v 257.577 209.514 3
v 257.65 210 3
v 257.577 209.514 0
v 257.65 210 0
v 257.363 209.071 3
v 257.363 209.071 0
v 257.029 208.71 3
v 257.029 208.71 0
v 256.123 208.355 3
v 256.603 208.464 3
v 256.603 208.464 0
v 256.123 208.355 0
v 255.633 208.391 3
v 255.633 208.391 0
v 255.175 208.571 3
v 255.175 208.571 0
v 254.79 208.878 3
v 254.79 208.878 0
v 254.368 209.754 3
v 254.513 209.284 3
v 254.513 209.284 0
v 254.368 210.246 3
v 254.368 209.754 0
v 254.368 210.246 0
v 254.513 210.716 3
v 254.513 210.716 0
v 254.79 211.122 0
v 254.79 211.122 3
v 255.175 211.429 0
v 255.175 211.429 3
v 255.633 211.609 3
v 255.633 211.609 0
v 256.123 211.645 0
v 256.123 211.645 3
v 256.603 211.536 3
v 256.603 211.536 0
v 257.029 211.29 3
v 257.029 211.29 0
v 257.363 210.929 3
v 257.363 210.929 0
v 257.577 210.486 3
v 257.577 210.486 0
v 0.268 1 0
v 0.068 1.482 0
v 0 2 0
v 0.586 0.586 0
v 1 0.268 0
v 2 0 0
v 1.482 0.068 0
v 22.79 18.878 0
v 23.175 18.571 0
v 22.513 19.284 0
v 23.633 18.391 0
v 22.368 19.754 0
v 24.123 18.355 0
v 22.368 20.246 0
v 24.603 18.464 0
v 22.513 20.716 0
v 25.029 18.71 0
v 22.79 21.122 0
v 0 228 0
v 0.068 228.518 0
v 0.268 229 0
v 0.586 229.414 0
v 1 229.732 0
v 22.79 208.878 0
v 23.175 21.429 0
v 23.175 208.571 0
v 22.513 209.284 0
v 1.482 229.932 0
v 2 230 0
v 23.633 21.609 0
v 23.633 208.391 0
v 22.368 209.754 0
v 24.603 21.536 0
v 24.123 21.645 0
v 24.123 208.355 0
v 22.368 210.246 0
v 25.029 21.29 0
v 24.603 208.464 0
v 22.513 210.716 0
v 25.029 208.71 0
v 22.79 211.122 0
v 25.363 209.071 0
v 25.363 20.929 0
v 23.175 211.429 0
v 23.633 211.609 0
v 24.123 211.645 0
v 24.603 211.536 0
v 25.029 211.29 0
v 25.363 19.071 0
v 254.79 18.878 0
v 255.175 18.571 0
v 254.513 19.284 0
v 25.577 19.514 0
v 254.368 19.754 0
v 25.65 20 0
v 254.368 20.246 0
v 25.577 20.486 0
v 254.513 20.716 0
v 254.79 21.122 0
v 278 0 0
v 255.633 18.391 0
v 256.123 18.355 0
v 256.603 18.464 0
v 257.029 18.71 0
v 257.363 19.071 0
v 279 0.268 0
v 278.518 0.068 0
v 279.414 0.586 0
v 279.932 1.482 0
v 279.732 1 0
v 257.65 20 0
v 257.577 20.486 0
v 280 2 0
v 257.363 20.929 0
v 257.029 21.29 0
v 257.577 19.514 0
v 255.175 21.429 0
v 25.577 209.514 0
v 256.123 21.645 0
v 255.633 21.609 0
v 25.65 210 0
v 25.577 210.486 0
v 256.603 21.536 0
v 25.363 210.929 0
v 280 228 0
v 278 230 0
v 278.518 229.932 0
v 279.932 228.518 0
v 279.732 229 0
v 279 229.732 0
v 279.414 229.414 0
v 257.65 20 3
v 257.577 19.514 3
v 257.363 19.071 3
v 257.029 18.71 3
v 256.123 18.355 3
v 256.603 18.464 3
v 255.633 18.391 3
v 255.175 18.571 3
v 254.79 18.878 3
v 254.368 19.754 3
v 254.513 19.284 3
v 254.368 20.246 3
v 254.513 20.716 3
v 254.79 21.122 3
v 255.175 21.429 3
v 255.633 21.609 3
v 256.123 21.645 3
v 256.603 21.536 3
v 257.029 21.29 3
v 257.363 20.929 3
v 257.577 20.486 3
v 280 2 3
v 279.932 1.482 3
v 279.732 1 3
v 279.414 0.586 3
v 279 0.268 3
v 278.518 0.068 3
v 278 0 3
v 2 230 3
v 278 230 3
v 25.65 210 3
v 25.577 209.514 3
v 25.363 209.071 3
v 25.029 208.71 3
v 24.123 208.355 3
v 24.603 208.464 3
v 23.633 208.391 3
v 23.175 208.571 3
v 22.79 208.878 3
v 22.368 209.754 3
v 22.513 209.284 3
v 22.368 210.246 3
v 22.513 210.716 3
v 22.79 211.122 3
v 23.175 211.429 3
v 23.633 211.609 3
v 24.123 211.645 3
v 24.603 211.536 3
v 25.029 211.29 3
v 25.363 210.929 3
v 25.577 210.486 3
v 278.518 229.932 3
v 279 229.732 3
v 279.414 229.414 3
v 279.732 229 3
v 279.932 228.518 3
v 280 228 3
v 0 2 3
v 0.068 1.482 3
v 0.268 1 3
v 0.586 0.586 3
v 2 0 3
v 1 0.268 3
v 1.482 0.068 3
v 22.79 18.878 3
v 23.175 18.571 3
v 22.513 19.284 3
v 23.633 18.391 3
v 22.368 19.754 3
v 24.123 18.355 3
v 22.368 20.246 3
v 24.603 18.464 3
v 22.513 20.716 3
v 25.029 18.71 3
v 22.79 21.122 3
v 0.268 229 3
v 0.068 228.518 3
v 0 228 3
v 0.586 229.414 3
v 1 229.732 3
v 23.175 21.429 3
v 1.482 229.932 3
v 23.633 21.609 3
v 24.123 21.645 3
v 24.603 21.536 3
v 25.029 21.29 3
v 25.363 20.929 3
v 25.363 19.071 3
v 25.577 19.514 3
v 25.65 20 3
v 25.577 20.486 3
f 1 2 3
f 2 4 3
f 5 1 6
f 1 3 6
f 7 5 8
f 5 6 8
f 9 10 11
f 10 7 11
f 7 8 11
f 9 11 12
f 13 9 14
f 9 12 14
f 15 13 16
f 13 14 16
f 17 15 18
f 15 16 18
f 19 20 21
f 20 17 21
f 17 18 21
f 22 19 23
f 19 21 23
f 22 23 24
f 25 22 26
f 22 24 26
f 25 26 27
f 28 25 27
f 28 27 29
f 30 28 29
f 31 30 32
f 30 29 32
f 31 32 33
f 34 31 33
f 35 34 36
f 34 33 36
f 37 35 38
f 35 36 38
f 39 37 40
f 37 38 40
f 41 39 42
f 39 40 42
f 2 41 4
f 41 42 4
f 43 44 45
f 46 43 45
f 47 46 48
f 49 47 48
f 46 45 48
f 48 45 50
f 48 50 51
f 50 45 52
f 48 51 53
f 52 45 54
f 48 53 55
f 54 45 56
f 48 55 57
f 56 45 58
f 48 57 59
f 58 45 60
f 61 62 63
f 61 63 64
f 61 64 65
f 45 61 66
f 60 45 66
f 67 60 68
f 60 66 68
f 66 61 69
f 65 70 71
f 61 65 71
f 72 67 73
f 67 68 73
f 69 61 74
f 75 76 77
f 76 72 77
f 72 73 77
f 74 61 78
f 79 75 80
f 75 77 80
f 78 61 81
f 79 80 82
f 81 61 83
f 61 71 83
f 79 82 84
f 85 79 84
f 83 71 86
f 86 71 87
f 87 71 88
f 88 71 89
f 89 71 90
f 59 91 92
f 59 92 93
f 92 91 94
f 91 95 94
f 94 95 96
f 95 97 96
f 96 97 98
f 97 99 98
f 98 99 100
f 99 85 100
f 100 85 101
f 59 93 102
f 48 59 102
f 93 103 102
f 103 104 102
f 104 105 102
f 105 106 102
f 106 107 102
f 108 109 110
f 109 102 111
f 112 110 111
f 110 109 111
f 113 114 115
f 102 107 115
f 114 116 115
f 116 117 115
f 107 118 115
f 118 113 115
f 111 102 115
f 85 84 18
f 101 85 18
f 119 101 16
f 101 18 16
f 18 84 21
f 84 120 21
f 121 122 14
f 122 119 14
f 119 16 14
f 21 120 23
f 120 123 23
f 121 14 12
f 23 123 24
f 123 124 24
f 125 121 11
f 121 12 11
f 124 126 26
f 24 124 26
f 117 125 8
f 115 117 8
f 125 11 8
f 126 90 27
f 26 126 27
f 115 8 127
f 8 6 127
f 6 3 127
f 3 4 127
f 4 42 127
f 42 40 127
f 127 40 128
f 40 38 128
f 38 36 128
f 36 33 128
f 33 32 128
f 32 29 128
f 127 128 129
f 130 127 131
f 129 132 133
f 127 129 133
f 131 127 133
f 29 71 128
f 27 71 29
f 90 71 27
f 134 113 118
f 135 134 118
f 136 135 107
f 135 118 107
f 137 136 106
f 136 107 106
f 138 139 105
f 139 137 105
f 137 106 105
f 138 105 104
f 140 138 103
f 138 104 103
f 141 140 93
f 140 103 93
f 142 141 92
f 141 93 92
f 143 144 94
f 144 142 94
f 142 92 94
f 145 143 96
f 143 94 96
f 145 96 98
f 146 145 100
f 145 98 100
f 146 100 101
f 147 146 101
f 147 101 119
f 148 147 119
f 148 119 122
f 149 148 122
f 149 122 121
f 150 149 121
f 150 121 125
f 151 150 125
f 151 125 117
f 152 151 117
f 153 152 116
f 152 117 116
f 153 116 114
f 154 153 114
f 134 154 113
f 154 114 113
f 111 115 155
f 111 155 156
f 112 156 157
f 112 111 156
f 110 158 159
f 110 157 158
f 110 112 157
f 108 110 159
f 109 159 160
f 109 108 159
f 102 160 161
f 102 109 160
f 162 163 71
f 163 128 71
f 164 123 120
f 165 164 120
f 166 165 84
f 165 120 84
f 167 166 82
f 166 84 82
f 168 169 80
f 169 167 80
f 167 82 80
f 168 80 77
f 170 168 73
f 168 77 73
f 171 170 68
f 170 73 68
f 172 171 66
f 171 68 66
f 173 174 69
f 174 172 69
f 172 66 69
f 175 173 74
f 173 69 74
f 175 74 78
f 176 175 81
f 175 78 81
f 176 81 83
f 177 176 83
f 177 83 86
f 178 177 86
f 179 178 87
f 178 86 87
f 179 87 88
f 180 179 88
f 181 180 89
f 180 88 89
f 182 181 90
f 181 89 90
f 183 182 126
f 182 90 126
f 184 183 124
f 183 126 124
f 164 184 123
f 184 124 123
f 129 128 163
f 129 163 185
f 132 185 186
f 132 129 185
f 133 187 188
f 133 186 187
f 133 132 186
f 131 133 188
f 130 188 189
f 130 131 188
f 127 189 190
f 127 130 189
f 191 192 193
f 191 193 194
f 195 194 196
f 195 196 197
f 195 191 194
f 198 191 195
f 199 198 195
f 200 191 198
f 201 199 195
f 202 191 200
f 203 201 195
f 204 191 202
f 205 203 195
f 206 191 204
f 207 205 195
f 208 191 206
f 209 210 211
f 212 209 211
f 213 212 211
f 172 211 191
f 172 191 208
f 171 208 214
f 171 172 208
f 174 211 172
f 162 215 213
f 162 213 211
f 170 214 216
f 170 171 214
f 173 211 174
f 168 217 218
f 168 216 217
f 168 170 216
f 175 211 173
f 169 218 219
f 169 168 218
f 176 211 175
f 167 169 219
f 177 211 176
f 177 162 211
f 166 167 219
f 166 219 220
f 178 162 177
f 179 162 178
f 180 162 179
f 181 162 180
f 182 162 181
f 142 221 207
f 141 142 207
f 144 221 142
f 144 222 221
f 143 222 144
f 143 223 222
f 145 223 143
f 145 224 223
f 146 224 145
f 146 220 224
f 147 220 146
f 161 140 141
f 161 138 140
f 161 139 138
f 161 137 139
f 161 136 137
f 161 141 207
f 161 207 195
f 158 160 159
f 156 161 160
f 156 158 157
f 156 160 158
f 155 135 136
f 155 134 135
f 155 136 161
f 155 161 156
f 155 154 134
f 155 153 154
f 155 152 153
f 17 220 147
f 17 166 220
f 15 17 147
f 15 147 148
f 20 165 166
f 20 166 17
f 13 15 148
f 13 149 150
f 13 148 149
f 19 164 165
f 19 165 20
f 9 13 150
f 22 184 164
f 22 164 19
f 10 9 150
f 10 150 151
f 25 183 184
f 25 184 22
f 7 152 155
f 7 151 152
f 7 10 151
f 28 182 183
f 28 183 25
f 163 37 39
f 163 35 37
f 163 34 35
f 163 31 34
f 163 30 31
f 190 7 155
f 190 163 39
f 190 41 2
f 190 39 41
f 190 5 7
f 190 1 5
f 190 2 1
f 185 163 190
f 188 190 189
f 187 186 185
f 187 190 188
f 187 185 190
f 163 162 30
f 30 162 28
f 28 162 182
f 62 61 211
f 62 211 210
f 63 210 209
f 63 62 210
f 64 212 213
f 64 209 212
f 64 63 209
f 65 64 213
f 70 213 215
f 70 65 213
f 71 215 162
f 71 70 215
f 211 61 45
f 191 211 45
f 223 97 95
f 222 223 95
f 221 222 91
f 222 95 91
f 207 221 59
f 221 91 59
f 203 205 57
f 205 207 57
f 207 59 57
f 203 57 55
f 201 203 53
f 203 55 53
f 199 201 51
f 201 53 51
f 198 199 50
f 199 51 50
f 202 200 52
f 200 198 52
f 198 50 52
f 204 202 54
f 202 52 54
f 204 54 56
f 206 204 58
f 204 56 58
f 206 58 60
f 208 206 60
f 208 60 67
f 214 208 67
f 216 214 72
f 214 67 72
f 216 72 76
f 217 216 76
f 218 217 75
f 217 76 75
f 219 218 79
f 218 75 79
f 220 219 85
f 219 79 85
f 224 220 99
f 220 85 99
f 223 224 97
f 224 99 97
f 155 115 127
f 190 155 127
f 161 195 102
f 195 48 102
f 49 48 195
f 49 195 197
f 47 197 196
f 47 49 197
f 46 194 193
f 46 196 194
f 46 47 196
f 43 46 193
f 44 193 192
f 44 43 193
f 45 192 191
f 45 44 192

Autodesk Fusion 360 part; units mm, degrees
sketch "Sketch1" plane through (0, 0, 0) normal (0, 0, 1) x (1, 0, 0)
  line L0 (2, 0) -> (278, 0)
  line L1 (280, 2) -> (280, 228)
  line L2 (278, 230) -> (2, 230)
  line L3 (0, 228) -> (0, 2)
  circle A0 centre (24, 210) radius 1.65
  circle A1 centre (256, 210) radius 1.65
  circle A2 centre (24, 20) radius 1.65
  circle A3 centre (256, 20) radius 1.65
  arc A4 (2, 230) -> (0, 228) centre (2, 228) ccw
  arc A5 (280, 228) -> (278, 230) centre (278, 228) ccw
  arc A6 (278, 0) -> (280, 2) centre (278, 2) ccw
  arc A7 (0, 2) -> (2, 0) centre (2, 2) ccw
  point P0 (280, 0)
  point P1 (0, 230)
  dimension "d1" = 280
  dimension "d2" = 230
  dimension "d3" = 3.3
  dimension "d5" = 24
  dimension "d6" = 20
  dimension "d9" = 232
  dimension "d10" = -190
  dimension "d12" = 2
extrude "Extrude1" add sketch "Sketch1" along normal blind 3
equation "d3 = hole_width"
equation "hole_width = 3.3 mm"
equation "d9 = 280 mm - ( 24 * 2 ) * 1 mm"
equation "d10 = -( 230 mm - ( 20 * 2 ) * 1 mm )"
equation "outer_rad = 2 mm"
